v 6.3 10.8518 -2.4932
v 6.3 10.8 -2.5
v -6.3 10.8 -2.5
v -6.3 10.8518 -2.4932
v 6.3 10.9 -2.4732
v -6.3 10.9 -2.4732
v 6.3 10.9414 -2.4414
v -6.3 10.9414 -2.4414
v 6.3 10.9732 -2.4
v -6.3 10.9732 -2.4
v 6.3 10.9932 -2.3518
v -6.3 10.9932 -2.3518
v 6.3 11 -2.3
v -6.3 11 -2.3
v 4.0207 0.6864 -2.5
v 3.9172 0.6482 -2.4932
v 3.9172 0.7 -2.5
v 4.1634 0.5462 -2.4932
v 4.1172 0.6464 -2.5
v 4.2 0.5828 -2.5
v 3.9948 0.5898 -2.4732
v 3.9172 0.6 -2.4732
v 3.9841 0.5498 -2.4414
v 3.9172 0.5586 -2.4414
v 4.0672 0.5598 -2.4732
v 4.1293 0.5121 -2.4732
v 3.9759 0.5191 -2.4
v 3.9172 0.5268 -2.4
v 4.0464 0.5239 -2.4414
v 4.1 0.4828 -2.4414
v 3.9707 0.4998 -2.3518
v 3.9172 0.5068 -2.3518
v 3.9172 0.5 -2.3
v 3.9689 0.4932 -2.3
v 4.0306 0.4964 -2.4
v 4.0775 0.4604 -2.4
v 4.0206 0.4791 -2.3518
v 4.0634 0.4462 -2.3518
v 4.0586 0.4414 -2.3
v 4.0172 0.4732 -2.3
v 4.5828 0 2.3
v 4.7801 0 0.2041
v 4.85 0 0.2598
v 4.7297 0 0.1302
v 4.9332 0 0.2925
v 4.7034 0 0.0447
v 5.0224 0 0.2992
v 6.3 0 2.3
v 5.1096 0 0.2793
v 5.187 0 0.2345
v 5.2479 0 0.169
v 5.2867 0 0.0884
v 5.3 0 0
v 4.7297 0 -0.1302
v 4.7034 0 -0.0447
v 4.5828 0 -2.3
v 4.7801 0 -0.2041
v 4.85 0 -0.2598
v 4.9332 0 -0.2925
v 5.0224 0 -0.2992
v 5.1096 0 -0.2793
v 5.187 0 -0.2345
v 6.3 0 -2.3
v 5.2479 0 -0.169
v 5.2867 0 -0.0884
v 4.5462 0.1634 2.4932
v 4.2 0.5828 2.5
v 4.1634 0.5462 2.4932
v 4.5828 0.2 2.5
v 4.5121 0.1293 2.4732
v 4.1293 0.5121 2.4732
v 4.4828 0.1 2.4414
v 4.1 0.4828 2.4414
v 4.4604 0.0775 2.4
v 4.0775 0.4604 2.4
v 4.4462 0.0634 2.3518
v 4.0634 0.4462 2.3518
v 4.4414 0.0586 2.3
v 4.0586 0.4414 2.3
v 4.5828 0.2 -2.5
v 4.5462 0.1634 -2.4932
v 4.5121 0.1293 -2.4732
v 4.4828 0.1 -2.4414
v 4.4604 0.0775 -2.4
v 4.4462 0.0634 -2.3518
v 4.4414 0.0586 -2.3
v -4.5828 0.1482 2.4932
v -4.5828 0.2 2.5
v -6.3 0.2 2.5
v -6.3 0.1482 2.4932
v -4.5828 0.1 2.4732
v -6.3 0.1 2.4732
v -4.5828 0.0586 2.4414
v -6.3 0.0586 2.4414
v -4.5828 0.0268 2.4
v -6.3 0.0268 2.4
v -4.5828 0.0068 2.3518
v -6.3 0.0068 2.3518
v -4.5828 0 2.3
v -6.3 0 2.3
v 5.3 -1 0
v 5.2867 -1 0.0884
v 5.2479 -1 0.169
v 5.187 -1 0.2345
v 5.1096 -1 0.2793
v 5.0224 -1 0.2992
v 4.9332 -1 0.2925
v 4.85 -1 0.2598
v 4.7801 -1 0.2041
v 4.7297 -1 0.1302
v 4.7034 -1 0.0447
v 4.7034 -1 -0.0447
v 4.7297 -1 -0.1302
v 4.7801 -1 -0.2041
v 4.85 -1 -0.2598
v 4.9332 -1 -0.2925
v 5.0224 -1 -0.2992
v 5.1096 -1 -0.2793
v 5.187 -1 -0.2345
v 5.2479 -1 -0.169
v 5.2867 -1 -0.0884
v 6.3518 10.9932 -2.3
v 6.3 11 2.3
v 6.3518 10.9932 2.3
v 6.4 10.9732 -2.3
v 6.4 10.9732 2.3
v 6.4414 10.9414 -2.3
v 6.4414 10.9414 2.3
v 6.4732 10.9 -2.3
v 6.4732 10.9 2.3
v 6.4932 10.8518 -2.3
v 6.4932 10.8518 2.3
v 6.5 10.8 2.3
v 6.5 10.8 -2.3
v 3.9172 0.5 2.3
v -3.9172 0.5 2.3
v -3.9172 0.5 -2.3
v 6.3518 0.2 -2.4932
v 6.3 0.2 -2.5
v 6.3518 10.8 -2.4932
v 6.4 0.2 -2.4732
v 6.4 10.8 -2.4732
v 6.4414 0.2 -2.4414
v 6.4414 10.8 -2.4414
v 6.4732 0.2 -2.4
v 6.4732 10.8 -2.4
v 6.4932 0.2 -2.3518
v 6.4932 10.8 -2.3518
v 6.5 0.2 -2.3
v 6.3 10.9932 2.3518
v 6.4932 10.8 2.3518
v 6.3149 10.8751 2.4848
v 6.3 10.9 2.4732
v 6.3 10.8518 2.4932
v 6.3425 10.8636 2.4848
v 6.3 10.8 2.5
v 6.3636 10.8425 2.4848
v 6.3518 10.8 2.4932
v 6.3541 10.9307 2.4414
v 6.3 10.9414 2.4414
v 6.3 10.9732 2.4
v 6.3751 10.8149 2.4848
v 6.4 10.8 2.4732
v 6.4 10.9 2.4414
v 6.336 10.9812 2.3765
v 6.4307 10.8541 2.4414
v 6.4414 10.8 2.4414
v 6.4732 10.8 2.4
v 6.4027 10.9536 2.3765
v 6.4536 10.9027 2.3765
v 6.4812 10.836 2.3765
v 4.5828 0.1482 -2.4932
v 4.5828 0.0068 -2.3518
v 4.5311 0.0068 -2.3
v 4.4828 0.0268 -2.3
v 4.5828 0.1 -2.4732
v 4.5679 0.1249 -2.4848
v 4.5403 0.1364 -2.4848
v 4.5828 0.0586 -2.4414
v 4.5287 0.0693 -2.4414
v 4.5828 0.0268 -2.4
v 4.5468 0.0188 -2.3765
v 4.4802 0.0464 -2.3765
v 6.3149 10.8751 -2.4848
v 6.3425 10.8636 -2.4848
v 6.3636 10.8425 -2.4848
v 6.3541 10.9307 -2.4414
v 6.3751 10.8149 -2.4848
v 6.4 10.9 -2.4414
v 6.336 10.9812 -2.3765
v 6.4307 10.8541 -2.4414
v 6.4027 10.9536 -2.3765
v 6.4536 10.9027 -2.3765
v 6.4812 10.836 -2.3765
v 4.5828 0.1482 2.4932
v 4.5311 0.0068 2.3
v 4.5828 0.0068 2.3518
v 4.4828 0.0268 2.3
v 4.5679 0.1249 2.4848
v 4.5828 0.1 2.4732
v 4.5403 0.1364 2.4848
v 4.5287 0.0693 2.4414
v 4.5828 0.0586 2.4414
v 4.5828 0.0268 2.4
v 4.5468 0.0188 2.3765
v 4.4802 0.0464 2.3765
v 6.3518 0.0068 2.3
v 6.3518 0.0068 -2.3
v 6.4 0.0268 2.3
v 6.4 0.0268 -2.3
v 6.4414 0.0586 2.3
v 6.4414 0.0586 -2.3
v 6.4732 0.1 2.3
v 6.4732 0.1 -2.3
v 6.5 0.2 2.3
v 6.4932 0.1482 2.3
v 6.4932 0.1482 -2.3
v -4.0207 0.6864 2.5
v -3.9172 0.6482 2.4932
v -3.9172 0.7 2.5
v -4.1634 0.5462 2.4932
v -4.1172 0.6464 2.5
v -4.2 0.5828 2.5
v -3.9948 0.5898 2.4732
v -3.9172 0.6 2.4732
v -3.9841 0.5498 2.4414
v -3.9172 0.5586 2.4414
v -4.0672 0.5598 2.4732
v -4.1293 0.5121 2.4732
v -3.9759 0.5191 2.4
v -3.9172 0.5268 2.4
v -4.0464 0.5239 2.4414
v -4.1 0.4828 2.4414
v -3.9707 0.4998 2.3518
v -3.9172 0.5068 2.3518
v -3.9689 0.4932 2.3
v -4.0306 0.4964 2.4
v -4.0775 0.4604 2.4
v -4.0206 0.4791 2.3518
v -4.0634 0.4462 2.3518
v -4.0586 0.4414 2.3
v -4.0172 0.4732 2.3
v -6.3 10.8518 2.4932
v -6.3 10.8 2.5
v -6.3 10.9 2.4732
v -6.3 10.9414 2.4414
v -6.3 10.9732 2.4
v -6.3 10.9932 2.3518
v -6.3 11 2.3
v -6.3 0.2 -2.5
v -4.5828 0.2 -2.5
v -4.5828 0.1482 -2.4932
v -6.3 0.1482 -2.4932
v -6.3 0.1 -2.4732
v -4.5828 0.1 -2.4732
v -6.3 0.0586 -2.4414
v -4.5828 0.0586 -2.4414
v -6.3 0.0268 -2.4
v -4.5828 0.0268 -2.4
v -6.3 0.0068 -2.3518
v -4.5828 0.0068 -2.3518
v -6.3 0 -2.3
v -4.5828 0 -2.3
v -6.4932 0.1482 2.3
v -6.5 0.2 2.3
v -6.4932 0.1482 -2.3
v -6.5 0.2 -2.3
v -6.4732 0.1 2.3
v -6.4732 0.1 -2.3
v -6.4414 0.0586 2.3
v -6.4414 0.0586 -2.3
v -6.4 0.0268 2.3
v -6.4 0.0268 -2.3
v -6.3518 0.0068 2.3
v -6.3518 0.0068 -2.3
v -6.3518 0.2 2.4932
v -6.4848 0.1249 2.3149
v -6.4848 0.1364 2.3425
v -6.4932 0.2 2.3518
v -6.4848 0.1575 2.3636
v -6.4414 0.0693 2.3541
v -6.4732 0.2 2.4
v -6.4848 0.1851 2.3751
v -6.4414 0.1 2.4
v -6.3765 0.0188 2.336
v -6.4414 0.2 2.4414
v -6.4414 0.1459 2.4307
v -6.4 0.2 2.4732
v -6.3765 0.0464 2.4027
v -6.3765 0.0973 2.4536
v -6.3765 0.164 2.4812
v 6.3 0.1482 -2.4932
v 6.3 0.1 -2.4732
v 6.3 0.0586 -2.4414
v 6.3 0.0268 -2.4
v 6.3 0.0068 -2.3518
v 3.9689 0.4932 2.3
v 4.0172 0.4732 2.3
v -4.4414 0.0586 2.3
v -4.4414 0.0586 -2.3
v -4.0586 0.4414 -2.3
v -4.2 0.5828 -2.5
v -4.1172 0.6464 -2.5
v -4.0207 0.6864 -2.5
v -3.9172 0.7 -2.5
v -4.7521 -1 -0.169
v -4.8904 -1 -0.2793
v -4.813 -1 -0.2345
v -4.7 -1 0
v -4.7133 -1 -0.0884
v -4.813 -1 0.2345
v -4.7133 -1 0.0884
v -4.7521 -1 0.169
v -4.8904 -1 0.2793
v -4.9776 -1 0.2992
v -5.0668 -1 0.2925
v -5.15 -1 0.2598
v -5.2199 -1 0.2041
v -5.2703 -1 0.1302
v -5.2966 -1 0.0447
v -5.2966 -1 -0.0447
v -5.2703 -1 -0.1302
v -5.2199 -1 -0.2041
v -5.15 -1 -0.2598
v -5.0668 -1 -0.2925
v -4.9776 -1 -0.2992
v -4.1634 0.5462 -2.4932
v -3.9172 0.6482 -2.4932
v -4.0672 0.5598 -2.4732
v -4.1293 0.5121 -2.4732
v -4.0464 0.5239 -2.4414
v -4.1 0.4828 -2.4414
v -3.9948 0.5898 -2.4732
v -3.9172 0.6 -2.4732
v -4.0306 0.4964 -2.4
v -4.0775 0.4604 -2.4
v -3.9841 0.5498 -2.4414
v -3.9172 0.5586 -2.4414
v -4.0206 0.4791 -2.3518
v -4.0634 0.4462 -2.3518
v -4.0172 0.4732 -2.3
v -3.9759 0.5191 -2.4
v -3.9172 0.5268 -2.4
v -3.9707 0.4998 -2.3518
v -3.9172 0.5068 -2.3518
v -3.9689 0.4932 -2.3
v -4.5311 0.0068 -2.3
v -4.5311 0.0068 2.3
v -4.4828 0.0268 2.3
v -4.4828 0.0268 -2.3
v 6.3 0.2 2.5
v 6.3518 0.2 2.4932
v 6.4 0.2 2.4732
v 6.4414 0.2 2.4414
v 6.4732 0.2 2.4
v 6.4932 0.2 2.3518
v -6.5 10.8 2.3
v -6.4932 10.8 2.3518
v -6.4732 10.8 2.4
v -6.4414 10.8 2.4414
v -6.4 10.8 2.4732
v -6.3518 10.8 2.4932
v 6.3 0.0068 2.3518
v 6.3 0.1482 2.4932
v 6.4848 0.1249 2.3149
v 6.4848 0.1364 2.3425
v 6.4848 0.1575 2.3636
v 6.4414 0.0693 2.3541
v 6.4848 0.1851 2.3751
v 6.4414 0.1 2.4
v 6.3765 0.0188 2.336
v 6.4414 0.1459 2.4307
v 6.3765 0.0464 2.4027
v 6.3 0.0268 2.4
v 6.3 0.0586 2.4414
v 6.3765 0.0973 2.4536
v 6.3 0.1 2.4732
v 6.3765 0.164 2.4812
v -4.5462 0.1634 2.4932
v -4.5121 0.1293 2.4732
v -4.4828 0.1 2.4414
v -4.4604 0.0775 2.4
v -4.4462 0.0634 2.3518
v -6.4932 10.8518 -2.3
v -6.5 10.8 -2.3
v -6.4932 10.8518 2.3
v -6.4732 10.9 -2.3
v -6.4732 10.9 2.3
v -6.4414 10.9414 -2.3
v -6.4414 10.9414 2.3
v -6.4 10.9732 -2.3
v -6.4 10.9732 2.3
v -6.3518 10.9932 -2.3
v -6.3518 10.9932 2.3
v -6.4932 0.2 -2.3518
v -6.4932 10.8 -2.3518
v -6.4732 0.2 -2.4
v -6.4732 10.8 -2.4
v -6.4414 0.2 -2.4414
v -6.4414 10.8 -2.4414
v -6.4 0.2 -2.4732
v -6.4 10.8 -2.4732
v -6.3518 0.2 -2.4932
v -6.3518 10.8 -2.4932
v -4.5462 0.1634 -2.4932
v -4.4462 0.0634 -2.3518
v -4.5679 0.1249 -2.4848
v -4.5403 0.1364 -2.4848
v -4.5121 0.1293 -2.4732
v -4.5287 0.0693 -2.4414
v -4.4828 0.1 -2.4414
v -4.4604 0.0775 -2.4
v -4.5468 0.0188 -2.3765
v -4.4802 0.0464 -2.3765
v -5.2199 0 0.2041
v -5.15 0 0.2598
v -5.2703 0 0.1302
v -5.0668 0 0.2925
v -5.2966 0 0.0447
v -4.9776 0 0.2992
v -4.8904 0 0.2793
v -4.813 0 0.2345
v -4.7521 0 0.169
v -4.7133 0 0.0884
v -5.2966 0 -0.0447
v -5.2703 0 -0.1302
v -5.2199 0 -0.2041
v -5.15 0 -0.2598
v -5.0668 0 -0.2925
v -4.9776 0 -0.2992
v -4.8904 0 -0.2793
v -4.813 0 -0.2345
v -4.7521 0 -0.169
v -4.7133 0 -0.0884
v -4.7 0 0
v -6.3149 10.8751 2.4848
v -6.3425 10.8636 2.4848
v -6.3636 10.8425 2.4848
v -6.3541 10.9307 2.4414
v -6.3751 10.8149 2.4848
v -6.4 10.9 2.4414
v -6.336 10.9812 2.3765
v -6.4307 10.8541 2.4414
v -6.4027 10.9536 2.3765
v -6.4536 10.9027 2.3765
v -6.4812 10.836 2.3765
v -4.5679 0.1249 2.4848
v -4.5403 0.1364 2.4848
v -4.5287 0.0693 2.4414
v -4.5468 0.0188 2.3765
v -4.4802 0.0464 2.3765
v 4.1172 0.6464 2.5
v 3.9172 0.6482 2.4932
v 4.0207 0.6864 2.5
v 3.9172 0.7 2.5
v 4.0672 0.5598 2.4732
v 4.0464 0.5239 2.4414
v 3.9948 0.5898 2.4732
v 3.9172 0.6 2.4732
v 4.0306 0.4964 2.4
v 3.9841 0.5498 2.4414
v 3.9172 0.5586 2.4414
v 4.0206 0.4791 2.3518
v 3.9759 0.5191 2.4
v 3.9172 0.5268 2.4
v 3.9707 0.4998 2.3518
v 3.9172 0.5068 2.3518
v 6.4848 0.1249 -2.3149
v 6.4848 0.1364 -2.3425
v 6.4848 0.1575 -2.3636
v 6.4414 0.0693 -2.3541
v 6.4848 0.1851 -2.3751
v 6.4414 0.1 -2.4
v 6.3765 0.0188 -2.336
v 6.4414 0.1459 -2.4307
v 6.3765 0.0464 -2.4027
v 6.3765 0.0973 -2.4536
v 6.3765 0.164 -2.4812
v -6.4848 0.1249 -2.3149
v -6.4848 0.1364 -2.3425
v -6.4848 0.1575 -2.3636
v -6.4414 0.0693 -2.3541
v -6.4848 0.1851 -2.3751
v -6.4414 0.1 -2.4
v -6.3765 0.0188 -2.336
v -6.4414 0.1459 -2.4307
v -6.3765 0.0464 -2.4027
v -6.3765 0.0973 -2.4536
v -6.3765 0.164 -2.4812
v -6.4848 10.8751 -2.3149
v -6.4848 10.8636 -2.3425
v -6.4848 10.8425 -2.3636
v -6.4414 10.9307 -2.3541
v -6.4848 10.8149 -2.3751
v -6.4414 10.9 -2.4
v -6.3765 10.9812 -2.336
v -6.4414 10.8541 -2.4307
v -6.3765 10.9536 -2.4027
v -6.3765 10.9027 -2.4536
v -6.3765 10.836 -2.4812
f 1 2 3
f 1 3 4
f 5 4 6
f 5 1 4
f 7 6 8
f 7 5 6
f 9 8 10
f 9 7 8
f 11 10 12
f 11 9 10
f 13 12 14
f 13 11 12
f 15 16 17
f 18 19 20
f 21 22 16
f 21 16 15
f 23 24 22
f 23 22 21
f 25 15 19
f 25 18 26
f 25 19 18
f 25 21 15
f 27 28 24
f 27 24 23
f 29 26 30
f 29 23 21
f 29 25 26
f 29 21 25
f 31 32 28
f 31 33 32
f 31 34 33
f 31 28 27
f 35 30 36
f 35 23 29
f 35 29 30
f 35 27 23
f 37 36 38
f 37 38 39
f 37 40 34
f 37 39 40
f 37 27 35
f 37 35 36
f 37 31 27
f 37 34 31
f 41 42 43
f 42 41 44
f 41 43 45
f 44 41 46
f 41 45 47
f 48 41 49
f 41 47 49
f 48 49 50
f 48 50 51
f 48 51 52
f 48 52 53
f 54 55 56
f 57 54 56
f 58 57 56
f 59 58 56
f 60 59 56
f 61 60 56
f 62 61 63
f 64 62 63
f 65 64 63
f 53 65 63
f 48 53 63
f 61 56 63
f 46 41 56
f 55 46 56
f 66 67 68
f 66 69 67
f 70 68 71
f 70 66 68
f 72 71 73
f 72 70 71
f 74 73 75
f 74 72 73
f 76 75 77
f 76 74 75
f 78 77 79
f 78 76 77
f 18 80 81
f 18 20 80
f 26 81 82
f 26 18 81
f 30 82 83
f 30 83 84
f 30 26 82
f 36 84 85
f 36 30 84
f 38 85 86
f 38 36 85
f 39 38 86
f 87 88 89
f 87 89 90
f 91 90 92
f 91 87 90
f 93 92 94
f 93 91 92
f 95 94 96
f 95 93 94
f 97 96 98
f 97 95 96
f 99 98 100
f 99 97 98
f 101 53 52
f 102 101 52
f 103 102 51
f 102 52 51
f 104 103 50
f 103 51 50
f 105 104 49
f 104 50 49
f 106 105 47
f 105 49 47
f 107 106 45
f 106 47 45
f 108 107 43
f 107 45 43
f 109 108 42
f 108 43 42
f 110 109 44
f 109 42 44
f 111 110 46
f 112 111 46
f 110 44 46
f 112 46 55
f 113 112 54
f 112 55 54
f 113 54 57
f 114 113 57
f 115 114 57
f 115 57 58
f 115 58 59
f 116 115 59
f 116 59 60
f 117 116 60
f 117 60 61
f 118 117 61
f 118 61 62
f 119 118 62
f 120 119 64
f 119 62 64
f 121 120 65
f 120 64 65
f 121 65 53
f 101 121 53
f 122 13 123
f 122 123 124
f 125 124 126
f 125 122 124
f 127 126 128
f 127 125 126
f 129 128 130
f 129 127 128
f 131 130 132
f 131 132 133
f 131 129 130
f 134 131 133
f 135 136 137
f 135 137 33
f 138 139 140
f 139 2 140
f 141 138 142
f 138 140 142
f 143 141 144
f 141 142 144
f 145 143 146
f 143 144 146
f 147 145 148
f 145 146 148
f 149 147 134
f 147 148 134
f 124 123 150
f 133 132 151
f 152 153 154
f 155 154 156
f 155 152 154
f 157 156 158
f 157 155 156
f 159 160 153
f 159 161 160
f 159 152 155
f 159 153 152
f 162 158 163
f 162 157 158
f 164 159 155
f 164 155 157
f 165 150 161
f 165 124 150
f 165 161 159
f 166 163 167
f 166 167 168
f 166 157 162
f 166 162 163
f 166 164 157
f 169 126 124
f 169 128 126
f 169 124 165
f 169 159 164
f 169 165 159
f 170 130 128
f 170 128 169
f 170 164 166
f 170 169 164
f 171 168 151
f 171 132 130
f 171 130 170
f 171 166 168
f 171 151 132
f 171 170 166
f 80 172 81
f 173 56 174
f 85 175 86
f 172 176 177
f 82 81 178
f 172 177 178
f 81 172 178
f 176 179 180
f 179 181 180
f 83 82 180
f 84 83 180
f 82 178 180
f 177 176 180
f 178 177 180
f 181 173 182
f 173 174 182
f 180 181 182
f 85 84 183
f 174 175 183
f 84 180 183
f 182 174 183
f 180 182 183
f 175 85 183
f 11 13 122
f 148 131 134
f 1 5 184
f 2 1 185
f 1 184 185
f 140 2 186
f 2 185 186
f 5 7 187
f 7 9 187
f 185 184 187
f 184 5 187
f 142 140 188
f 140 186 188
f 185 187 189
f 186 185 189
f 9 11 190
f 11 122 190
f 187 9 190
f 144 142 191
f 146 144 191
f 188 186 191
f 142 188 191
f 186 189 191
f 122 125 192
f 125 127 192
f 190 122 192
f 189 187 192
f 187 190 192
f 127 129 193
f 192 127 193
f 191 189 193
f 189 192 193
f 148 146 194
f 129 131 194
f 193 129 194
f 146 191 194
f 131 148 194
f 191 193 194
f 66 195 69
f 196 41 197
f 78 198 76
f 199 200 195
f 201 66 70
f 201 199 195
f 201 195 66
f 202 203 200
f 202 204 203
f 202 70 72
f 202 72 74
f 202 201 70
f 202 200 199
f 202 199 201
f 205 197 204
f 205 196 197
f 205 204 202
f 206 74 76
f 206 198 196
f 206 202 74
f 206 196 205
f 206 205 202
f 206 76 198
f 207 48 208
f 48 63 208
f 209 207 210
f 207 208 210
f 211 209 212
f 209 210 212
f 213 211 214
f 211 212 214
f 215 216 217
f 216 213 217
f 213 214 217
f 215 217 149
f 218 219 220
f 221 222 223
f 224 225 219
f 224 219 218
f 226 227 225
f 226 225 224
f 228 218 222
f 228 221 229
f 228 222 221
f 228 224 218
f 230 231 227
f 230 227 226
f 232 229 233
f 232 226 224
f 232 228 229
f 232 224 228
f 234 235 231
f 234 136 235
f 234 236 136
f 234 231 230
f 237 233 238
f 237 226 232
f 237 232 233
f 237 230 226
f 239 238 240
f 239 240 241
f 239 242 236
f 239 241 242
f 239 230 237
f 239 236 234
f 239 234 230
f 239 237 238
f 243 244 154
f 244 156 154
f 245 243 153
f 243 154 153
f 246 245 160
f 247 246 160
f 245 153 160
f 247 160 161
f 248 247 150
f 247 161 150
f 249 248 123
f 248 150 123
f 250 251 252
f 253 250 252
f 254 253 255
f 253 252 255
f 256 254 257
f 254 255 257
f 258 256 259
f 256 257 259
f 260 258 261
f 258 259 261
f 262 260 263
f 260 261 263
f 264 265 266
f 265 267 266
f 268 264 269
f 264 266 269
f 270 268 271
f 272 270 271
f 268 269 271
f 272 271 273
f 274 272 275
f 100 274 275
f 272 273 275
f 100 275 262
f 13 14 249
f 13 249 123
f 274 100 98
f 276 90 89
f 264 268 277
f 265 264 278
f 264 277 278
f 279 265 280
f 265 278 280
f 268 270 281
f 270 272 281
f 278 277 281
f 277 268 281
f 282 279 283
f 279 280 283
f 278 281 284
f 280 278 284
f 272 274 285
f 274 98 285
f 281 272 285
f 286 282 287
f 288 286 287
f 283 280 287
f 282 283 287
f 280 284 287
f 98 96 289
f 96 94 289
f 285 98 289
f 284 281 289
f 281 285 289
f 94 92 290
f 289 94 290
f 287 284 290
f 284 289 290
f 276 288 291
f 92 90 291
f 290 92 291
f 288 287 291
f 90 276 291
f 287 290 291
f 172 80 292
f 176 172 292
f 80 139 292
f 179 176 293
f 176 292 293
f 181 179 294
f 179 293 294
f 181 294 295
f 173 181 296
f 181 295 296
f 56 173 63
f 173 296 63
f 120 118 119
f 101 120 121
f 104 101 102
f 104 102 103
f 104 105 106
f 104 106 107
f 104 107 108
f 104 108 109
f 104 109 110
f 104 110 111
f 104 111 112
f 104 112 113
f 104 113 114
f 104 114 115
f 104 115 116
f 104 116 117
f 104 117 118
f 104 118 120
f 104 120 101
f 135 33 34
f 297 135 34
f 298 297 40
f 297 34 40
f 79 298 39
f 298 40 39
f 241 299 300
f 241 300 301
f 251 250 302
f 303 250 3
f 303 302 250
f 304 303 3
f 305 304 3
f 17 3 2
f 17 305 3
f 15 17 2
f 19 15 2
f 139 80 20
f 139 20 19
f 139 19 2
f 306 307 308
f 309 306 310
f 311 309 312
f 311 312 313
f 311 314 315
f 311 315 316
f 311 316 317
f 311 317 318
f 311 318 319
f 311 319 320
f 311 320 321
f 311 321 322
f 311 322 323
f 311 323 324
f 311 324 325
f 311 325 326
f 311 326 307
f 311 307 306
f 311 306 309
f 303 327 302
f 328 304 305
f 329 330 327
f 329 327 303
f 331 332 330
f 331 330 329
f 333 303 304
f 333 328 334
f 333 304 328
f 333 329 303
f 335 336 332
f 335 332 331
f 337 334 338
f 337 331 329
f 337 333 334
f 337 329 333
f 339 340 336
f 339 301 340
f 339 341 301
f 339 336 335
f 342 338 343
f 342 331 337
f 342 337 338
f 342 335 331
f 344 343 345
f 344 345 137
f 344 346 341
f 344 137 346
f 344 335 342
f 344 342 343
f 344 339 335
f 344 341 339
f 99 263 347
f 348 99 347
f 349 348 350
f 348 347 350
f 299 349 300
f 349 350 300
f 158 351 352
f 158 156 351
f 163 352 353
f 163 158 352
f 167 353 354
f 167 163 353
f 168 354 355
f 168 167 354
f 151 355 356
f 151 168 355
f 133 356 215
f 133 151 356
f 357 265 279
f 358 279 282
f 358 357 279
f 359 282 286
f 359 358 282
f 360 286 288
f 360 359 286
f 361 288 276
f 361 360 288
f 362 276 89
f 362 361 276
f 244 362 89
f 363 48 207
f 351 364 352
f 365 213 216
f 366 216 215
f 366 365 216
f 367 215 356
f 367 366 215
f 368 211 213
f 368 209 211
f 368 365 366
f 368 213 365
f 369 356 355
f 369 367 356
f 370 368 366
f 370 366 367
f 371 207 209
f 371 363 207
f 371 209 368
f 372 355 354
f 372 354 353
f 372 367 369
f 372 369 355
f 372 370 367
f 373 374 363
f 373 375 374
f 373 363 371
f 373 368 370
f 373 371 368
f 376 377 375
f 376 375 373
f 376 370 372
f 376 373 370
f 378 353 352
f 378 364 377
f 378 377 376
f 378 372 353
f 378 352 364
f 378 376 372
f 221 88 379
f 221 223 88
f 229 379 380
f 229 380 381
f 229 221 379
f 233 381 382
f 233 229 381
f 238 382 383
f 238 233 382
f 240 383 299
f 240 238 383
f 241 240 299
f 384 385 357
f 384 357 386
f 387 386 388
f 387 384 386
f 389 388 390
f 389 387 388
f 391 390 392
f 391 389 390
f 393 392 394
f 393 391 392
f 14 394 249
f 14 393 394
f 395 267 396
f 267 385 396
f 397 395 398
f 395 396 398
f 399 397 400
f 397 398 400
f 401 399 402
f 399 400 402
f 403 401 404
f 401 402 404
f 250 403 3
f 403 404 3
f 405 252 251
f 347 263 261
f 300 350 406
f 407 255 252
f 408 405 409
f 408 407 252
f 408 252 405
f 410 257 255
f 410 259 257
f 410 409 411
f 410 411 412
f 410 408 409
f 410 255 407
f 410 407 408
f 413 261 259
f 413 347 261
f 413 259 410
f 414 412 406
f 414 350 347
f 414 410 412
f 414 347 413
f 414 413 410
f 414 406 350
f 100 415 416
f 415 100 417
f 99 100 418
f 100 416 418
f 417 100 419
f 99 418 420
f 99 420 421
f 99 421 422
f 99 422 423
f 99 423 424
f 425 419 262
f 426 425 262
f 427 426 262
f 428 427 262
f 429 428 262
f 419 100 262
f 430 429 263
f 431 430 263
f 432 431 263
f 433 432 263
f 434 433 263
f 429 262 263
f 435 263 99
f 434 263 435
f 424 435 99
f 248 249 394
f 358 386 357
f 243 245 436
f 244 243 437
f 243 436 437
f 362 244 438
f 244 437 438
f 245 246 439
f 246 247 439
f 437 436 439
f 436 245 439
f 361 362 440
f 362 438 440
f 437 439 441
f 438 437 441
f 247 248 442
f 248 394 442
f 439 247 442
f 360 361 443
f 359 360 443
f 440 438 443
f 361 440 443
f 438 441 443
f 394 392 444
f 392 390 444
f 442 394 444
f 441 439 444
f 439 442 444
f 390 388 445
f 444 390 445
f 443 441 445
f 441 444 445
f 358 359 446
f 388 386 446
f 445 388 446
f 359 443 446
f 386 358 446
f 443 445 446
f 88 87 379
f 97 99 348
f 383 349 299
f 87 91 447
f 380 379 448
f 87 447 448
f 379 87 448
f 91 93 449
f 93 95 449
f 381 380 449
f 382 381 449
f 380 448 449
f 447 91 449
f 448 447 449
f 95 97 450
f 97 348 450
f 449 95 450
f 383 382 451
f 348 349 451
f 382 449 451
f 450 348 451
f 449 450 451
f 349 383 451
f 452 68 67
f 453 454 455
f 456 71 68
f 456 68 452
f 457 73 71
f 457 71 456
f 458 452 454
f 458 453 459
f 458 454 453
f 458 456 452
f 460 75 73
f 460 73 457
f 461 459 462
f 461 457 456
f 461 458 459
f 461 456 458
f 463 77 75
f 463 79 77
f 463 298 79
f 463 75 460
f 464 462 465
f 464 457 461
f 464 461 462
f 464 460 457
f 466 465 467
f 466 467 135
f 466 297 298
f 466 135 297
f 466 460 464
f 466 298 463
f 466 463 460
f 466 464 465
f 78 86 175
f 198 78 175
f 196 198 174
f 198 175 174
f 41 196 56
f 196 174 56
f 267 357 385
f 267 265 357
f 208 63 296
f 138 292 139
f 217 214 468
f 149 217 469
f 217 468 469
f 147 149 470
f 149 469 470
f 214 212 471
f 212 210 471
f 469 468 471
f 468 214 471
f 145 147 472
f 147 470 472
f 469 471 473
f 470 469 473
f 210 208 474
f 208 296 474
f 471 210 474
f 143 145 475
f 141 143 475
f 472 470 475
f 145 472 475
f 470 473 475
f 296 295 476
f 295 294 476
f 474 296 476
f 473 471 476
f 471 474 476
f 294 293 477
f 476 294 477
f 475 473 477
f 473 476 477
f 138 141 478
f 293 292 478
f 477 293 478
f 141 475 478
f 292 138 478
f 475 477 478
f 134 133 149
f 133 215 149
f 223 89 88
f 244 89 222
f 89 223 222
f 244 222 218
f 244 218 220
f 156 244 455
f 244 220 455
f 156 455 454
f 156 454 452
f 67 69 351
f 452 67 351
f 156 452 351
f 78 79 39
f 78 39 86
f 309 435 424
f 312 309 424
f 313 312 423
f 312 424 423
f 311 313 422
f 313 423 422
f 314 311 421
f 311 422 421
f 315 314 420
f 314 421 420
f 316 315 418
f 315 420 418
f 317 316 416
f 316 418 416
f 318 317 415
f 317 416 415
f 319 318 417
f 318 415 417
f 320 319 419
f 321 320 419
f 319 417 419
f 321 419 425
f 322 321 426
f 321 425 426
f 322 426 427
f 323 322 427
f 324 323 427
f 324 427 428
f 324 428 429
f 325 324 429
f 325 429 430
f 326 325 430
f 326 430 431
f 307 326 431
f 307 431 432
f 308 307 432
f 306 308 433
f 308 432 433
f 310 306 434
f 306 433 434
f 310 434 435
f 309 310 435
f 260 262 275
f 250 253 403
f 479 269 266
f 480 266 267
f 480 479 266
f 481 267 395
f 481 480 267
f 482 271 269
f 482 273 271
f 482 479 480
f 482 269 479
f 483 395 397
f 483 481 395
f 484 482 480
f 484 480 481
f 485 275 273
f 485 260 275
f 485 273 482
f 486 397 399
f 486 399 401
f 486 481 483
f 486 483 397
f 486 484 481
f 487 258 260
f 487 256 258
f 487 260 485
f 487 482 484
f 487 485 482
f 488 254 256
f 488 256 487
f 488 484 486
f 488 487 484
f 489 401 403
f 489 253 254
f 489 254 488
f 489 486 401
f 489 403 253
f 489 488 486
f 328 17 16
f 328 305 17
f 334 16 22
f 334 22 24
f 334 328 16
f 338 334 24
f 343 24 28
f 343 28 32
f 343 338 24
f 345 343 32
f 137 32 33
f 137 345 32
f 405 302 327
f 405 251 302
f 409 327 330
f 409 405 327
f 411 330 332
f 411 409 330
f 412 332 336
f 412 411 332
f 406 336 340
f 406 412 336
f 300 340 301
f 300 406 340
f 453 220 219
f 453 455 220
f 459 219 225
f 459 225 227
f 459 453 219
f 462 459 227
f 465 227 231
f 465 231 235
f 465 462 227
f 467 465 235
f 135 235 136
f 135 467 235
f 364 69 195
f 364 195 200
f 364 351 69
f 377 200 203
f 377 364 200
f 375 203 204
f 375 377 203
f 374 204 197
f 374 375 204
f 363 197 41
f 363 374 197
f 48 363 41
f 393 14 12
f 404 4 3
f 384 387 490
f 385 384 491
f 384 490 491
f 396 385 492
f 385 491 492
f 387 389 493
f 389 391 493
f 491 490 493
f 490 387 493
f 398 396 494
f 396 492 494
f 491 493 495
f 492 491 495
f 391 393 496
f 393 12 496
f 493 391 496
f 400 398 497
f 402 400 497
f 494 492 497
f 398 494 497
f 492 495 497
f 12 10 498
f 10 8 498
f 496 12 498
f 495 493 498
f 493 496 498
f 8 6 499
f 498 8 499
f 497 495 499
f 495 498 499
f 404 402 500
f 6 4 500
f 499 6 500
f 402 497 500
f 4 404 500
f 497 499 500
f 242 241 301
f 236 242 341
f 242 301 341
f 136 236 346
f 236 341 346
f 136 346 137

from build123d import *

# Parameters (mm, degrees)
SKETCH1_W           = 13
SKETCH1_H           = 5
BOSS_EXTRUDE1_DEPTH = 11
CUT_EXTRUDE1_DEPTH  = 6
SKETCH3_R           = 0.3
BOSS_EXTRUDE2_DEPTH = 1
FILLET1_R           = 0.2


with BuildPart() as part:
    # Sketch1 → Boss-Extrude1 (new body)
    with BuildSketch(Plane(origin=(0, 0, 0), x_dir=(1, 0, 0), z_dir=(0, 1, 0))):
        Rectangle(SKETCH1_W, SKETCH1_H)
    extrude(amount=BOSS_EXTRUDE1_DEPTH)

    # Sketch2 → Cut-Extrude1 (cut, through all)
    with BuildSketch(Plane.XY.offset(2.5)):
        Polygon((-4.5, 0), (-4, 0.5), (4, 0.5), (4.5, 0), (4.5, -1.5), (-4.5, -1.5), align=None)
    extrude(amount=-CUT_EXTRUDE1_DEPTH, mode=Mode.SUBTRACT)

    # Sketch3 → Boss-Extrude2 (add)
    with BuildSketch(Plane.XZ):
        with Locations((5, 0)):
            Circle(SKETCH3_R)
        with Locations((-5, 0)):
            Circle(SKETCH3_R)
    extrude(amount=BOSS_EXTRUDE2_DEPTH)

    # Fillet1
    fillet1_edges = [part.edges().sort_by_distance(p)[0] for p in [
        (6.5, 11, 0),
        (0, 11, -2.5),
        (-5.5, 0, -2.5),
        (5.5, 0, 2.5),
        (4.25, 0.25, 2.5),
        (0, 0.5, 2.5),
        (-4.25, 0.25, 2.5),
        (-4.25, 0.25, -2.5),
        (-4.5, 0, 0),
        (0, 0.5, -2.5),
        (-4, 0.5, 0),
        (4.25, 0.25, -2.5),
        (4, 0.5, 0),
        (4.5, 0, 0),
        (-6.5, 11, 0),
        (5.5, 0, -2.5),
        (6.5, 0, 0),
        (-5.5, 0, 2.5),
        (-6.5, 0, 0),
        (0, 11, 2.5),
        (-6.5, 5.5, -2.5),
        (6.5, 5.5, -2.5),
        (6.5, 5.5, 2.5),
        (-6.5, 5.5, 2.5),
    ]]
    fillet(fillet1_edges, radius=FILLET1_R)


solid = part.part
